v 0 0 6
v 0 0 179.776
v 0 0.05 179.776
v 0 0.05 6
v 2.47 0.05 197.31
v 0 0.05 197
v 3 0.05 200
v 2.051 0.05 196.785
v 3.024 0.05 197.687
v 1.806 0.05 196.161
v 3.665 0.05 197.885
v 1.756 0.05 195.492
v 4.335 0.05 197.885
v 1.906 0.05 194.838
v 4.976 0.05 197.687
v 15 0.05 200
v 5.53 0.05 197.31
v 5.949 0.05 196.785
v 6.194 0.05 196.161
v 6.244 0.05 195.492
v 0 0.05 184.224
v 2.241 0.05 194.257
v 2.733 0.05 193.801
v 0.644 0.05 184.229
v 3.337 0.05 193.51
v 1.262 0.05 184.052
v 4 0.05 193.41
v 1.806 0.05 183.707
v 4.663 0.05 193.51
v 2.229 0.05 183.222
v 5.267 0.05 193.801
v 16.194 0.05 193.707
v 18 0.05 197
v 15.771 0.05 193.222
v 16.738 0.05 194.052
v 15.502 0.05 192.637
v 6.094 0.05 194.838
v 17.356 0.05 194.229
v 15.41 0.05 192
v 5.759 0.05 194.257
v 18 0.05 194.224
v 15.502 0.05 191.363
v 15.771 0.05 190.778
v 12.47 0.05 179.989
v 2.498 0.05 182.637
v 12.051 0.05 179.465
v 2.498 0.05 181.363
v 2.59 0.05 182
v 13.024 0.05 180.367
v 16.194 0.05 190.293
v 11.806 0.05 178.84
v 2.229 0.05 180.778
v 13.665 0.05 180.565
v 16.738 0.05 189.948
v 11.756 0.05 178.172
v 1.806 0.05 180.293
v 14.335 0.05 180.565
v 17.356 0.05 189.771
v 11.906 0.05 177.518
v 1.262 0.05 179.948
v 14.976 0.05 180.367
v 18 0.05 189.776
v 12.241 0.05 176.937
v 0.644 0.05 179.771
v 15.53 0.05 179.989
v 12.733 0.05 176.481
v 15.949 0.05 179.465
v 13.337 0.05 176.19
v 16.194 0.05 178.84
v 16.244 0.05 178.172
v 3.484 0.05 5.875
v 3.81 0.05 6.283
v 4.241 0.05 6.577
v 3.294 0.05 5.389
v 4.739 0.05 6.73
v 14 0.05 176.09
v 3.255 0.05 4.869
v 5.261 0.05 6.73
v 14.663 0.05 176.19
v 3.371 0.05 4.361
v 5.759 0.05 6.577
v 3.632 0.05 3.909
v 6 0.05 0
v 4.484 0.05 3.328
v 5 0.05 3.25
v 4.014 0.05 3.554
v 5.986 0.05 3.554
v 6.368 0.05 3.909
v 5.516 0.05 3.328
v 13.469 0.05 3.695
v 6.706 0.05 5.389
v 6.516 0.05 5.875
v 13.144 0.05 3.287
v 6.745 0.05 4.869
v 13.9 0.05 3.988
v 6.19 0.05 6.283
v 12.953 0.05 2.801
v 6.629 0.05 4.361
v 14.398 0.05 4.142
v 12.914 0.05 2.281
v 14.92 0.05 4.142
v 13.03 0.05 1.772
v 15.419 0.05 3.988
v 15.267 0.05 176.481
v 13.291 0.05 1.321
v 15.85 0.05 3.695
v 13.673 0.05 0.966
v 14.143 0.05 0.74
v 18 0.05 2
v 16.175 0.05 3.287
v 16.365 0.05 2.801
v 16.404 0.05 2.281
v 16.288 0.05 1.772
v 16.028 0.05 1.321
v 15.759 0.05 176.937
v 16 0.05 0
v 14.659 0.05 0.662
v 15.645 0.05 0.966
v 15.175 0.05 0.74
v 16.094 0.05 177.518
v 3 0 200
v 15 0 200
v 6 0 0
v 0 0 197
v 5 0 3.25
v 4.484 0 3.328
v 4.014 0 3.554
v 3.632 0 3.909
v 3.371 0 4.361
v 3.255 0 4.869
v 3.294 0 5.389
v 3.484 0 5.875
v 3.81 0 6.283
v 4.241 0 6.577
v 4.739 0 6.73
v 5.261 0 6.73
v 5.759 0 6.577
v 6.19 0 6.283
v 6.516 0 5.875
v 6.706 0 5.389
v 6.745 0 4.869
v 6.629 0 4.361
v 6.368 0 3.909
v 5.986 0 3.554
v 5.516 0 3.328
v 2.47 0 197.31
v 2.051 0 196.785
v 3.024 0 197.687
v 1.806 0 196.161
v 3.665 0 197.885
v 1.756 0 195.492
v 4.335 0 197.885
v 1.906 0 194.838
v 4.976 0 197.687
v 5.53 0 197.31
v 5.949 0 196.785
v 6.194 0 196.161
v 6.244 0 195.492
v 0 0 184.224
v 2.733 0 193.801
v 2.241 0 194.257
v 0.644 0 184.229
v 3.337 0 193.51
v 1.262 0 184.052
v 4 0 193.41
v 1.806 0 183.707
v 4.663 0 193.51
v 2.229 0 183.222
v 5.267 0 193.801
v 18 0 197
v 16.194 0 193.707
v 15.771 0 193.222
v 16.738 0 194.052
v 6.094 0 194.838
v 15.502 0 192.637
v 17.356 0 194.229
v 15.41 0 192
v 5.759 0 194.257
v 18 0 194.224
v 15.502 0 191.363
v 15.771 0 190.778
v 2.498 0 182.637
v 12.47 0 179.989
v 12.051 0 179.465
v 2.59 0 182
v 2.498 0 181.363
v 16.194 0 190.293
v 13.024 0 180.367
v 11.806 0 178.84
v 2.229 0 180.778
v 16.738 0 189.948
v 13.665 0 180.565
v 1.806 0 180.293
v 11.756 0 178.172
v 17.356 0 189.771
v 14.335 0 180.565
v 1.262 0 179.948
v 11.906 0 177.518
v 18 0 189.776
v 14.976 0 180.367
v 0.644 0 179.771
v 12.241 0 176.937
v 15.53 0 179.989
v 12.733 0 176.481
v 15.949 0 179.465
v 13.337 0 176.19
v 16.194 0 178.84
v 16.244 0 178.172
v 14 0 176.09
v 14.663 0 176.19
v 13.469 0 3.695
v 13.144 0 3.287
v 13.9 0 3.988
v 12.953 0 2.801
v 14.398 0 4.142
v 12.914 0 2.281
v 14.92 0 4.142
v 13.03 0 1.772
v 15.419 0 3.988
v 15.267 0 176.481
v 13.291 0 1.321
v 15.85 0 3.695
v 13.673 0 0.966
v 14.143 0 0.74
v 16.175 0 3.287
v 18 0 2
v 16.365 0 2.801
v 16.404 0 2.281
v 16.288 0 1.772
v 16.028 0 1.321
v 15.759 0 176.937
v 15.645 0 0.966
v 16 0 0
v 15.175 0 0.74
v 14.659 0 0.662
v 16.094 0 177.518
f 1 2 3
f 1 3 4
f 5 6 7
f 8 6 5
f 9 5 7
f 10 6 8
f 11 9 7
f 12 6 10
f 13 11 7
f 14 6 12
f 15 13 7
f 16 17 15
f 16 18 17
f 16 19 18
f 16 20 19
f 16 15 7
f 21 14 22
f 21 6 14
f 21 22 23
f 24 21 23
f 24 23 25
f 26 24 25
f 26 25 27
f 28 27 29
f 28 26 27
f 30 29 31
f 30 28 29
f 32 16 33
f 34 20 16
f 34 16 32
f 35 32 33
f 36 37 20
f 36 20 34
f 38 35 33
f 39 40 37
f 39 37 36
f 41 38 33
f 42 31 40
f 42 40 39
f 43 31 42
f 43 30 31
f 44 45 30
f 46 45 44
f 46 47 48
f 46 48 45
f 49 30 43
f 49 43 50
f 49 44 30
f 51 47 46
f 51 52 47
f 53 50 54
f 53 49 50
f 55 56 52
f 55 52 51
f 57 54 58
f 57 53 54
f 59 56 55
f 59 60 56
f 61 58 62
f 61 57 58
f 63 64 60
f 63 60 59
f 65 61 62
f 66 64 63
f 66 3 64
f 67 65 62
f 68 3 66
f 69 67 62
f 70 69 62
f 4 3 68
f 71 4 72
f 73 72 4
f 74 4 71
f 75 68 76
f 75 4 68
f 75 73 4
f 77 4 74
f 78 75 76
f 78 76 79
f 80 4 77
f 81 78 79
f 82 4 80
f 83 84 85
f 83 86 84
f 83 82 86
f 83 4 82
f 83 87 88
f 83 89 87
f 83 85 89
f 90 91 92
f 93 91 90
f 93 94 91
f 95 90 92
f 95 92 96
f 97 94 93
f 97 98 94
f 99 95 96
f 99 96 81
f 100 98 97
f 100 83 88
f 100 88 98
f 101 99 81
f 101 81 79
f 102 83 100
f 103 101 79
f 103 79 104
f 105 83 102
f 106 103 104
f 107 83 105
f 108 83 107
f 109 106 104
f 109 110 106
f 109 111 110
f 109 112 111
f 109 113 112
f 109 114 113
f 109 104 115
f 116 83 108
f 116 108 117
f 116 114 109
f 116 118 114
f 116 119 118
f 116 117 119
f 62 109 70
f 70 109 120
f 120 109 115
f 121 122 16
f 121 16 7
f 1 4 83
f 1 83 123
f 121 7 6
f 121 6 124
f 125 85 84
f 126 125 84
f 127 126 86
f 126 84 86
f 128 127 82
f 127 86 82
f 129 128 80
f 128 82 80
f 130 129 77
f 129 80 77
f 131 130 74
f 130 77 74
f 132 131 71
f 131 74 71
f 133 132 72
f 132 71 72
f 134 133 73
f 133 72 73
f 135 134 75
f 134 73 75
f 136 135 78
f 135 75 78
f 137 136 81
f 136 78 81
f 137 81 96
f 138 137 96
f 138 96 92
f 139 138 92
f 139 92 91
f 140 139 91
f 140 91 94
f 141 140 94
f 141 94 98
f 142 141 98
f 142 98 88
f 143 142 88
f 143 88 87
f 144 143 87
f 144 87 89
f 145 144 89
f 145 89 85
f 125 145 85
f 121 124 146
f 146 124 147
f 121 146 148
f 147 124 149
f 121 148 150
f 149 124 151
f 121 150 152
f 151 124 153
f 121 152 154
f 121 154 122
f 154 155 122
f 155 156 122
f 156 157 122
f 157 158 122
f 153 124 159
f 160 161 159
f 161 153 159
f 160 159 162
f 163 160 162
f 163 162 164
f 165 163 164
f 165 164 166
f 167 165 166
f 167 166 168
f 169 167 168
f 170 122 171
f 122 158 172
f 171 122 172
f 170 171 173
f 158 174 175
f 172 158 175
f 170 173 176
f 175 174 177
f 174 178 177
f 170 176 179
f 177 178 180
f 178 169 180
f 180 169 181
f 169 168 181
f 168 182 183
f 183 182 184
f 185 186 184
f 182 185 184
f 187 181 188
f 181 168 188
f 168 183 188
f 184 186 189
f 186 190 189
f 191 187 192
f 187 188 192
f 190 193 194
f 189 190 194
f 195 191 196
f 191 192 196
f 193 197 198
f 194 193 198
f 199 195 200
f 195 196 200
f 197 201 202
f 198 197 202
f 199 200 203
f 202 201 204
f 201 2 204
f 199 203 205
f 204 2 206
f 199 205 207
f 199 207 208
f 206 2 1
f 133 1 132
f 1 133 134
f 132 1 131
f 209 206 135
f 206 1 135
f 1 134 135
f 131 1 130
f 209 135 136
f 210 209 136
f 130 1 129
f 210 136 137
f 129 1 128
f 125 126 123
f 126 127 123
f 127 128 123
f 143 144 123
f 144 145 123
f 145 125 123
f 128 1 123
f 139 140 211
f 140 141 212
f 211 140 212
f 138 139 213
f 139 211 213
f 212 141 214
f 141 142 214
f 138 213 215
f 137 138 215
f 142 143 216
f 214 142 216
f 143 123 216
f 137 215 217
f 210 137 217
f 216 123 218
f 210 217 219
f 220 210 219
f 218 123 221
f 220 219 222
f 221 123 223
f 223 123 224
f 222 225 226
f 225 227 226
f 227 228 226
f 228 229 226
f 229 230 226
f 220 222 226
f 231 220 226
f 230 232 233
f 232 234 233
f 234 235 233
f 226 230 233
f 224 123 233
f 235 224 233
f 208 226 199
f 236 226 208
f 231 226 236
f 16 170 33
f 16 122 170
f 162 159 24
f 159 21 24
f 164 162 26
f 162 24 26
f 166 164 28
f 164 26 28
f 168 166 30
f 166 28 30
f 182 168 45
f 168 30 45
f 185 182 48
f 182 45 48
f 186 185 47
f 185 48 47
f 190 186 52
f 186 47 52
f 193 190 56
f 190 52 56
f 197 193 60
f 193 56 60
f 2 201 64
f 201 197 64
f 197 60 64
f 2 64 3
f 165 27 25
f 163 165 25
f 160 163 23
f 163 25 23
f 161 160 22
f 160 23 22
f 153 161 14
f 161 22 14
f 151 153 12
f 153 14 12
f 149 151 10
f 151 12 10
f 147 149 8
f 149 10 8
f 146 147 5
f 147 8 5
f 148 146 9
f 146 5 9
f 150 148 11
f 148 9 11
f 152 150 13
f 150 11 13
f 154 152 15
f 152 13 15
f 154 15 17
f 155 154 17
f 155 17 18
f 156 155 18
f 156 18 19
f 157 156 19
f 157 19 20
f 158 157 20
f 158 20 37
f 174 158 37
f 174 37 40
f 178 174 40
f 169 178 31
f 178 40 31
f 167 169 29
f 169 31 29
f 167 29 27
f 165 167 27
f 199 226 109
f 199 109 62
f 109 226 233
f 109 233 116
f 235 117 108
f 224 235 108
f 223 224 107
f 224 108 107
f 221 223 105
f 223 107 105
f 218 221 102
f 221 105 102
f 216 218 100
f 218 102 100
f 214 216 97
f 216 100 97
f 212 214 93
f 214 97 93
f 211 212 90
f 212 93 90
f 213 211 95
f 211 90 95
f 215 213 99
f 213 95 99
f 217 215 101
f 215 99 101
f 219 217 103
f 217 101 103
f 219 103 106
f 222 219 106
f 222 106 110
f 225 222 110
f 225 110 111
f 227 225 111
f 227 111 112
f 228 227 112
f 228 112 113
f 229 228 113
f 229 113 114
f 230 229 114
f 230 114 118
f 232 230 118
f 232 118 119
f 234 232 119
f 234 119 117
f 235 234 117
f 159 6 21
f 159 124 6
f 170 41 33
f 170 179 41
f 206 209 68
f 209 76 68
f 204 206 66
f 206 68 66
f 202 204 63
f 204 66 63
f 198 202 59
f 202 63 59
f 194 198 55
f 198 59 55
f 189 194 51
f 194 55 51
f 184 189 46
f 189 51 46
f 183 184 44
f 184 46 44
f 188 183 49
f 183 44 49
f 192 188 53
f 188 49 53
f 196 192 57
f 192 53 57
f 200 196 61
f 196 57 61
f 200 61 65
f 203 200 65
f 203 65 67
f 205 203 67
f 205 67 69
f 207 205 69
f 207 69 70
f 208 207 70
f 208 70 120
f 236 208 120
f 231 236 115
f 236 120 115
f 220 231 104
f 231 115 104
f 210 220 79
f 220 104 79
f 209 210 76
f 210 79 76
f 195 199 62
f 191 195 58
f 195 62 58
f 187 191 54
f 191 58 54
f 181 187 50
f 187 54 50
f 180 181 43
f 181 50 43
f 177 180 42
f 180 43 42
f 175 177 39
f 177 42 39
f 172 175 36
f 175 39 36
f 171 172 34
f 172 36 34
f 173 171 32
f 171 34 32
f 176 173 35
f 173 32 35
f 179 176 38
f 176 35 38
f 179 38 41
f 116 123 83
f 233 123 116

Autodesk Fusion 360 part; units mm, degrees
sketch "Sketch1" plane through (0, 0, 0) normal (0, 1, 0) x (1, 0, 0)
  line L0 (0, 0) -> (18, 0)
  line L1 (18, 0) -> (18, -200)
  line L2 (18, -200) -> (0, -200)
  line L3 (0, -200) -> (0, 0)
  circle A0 centre (9, -187) radius 10
  line L4 (9, -187) -> (19, -187) construction
  line L5 (9, -187) -> (14, -178.3397) construction
  line L6 (9, -200) -> (9, -187) construction
  line L7 (5, -5) -> (14.6593, -2.4118) construction
  point P0 (5, -5)
  point P1 (14.6593, -2.4118)
  point P2 (14, -178.3397)
  point P3 (0.3397, -182)
  point P4 (4, -195.6603)
  point P5 (17.6603, -192)
  dimension "d1" = 18
  dimension "d2" = 200
  dimension "d3" = 10
  dimension "d4" = 5
  dimension "d5" = 5
  dimension "d12" = 20
  dimension "d13" = 60
  dimension "d14" = 13
  dimension "d19" = 360
  dimension "d20" = 15
extrude "Extrude1" add sketch "Sketch1" along normal blind 0.05 contours L0 L1 L3 A0 | L1 L3 A0 | L1 L2 L3 A0
hole "Hole1" at (5, 0, 5) at (14.6593, 0, 2.4118) direction (0, 1, 0) diameter 3.5 end through all
chamfer "Chamfer1" distance 3 angle 45 2 edges at (18, 0.025, 200) (0, 0.025, 200)
hole "Hole2" at (14, 0, 178.3397) at (0.3397, 0, 182) at (4, 0, 195.6603) at (17.6603, 0, 192) direction (0, 1, 0) diameter 4.5 depth 0.05 tip angle 118
chamfer "Chamfer2" distance 2 angle 45 1 edges at (18, 0.025, 0)
chamfer "Chamfer3" distance 6 angle 45 1 edges at (0, 0.025, 0)
